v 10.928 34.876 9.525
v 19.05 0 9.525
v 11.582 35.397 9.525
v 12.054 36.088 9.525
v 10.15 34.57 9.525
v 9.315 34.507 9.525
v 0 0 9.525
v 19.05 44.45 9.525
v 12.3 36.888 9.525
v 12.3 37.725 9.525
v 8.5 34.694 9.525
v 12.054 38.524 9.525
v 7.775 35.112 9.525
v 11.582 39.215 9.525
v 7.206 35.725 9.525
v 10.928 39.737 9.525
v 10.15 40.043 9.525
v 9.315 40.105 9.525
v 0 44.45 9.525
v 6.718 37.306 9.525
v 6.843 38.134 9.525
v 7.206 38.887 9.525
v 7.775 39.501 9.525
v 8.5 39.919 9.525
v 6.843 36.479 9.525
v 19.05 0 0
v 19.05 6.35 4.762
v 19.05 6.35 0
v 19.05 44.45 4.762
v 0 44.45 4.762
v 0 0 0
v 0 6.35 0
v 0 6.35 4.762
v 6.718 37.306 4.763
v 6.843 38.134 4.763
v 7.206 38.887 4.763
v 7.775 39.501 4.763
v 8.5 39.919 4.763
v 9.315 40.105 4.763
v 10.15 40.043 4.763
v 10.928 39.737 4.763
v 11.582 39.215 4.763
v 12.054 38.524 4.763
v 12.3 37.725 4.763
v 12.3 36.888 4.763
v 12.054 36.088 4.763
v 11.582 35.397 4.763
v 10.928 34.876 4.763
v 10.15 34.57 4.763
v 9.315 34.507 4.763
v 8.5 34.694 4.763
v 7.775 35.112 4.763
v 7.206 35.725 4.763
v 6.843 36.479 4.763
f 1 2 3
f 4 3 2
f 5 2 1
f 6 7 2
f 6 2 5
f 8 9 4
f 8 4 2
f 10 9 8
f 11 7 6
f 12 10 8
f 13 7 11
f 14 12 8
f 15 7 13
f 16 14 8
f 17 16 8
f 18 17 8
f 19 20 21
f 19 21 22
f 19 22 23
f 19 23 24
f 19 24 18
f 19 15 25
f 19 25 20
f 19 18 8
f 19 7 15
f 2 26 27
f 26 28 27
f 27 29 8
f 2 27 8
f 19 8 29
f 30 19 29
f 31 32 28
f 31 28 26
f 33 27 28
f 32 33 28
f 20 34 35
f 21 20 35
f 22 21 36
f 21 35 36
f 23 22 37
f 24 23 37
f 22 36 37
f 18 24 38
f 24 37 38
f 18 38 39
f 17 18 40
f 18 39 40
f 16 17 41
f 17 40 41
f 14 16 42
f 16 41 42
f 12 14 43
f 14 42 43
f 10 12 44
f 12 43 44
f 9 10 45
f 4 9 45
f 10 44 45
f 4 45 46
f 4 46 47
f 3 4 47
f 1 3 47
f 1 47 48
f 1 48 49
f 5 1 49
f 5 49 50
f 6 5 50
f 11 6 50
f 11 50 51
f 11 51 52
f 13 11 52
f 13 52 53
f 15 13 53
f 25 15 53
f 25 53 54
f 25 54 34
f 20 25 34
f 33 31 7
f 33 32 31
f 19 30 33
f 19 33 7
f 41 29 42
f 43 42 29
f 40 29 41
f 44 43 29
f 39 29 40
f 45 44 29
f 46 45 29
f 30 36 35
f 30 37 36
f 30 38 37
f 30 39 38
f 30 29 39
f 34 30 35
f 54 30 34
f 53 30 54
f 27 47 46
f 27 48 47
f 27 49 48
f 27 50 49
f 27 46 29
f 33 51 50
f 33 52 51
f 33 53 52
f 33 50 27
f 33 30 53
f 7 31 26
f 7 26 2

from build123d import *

# Parameters (mm, degrees)
EXTRUDE1_DEPTH         = 19.05
F_10_CLEARANCE_HOLE1_D = 5.6134


with BuildPart() as part:
    # Sketch1 → Extrude1 (new body)
    with BuildSketch(Plane(origin=(0, 0, 0), x_dir=(0, 0, -1), z_dir=(1, 0, 0))):
        Polygon((0, 0), (-9.525, 0), (-9.525, 44.45), (-4.7625, 44.45), (-4.7625, 6.35), (0, 6.35), align=None)
    extrude(amount=EXTRUDE1_DEPTH)

    # #10 Clearance Hole1 (through all)
    with Locations(Plane.XY.offset(9.525)):
        with Locations((9.525, 37.30625)):
            Hole(F_10_CLEARANCE_HOLE1_D / 2)


solid = part.part
